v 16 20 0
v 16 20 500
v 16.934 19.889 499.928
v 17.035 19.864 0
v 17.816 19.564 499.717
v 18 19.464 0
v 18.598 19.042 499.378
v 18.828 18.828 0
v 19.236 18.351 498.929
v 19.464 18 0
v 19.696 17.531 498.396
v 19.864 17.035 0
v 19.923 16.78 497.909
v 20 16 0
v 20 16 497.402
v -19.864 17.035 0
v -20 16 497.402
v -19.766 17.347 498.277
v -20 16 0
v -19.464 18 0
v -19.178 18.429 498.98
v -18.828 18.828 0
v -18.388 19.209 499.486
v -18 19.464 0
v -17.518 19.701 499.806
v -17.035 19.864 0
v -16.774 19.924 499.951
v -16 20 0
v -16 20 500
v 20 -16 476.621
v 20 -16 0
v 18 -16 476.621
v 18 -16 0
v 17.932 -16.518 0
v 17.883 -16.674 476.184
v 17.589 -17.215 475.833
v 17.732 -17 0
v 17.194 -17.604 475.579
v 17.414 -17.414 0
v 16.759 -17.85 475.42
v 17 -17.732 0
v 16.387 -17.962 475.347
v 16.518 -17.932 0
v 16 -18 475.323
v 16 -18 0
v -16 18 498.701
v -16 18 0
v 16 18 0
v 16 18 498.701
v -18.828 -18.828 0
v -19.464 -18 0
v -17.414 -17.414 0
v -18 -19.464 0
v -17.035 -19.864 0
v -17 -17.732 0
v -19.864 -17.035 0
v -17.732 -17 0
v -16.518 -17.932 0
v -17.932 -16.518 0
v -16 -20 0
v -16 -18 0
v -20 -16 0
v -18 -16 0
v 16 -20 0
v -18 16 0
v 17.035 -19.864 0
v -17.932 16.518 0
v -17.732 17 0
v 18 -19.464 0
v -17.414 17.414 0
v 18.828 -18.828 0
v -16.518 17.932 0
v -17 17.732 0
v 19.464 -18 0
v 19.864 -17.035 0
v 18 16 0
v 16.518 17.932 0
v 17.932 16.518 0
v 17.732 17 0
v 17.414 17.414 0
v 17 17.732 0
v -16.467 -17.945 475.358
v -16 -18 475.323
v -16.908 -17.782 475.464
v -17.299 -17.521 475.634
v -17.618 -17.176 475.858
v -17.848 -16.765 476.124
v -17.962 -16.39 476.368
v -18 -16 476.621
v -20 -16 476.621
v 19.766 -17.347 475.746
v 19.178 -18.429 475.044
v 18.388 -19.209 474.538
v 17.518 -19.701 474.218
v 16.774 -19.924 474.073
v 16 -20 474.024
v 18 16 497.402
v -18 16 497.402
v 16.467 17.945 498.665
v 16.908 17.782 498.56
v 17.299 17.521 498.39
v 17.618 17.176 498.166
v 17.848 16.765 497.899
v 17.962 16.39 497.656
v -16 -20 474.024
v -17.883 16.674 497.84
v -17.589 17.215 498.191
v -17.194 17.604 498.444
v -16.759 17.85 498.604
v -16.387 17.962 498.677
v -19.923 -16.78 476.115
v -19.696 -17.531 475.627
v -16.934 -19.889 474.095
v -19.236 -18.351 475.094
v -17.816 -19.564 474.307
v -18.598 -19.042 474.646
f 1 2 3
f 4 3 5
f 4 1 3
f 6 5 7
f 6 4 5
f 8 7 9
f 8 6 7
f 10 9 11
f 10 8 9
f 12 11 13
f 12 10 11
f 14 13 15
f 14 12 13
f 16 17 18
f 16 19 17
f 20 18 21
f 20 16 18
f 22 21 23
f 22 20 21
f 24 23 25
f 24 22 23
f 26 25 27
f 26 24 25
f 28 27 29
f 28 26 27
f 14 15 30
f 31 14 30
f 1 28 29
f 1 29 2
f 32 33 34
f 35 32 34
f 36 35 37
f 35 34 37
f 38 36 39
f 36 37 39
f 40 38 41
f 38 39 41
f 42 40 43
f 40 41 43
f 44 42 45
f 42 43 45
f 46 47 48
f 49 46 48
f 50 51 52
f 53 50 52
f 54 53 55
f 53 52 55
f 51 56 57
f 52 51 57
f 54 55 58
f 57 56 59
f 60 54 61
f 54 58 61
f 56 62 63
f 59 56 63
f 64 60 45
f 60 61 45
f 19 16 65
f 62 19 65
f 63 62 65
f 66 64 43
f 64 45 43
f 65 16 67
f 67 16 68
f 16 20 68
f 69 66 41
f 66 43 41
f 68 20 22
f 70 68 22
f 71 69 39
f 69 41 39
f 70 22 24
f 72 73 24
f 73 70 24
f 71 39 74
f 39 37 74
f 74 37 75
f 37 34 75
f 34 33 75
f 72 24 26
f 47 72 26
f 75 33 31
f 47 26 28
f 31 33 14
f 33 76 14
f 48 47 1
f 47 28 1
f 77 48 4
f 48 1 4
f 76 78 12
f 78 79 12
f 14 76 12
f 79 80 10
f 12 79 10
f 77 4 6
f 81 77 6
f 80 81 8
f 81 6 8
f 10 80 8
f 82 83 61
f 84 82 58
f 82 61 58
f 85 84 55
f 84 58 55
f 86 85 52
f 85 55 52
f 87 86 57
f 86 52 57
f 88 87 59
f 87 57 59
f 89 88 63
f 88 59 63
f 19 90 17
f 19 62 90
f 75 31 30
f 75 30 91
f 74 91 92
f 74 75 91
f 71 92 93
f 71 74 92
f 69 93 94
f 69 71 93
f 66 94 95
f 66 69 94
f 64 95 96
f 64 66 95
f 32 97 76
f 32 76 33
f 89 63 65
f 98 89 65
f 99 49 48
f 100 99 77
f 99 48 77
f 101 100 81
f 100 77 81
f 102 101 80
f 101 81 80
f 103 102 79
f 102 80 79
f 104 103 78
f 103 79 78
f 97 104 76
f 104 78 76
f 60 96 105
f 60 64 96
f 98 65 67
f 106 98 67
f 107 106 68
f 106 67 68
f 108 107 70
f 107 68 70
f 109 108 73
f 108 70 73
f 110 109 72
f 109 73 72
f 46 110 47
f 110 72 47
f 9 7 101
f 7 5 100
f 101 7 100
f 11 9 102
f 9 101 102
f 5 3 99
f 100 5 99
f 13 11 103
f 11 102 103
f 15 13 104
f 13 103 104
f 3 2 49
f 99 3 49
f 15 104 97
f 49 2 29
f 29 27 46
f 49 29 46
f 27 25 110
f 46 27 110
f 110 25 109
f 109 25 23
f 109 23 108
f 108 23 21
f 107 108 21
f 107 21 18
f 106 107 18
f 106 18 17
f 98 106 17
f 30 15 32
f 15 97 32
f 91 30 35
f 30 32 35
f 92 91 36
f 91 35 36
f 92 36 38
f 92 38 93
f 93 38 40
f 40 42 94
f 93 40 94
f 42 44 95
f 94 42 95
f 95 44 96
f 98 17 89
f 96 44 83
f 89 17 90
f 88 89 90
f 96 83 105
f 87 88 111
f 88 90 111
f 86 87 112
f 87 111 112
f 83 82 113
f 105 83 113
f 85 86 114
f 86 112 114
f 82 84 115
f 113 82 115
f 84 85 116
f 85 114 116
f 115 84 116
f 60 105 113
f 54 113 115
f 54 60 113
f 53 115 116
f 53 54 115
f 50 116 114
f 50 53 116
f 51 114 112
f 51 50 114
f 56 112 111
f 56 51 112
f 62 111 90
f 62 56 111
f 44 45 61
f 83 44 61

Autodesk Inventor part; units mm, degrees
ref_plane "YZ Plane" through (0, 0, 0) normal (1, 0, 0) x (0, 1, 0)
ref_plane "Start plane" through (0, 0, 0) normal (0, 0, 1) x (1, 0, 0)
ref_plane "End plane" through (0, 0, 500) normal (0, 0, 1) x (1, 0, 0)
sketch "Sketch" plane through (0, 0, 0) normal (0, 0, 1) x (1, 0, 0)
  line L0 (-20, -16) -> (-20, 16)
  line L1 (-16, 20) -> (16, 20)
  line L2 (20, 16) -> (20, -16)
  line L3 (16, -20) -> (-16, -20)
  arc A0 (-20, -16) -> (-16, -20) centre (-16, -16) ccw
  arc A1 (20, 16) -> (16, 20) centre (16, 16) ccw
  arc A2 (-16, 20) -> (-20, 16) centre (-16, 16) ccw
  arc A3 (16, -20) -> (20, -16) centre (16, -16) ccw
  arc A4 (-16, 18) -> (-18, 16) centre (-16, 16) ccw
  line L4 (-16, 18) -> (16, 18)
  arc A5 (18, 16) -> (16, 18) centre (16, 16) ccw
  line L5 (18, 16) -> (18, -16)
  arc A6 (16, -18) -> (18, -16) centre (16, -16) ccw
  line L6 (16, -18) -> (-16, -18)
  arc A7 (-18, -16) -> (-16, -18) centre (-16, -16) ccw
  line L7 (-18, -16) -> (-18, 16)
  line L8 (0, 29.1598) -> (0, -29.1598) construction
  line L9 (-29.1598, 0) -> (29.1598, 0) construction
  dimension "d7" = 4
  dimension "d9" = 40
  dimension "d11" = 40
  dimension "d12" = 2
  dimension "d15" = 20
  dimension "d16" = 20
extrude "Body" add sketch "Sketch" along normal up to surface (500 mm away) from surface at 0
sketch "Sketch3" plane through (0, 0, 0) normal (0, 0, 1) x (1, 0, 0)
  line L0 (0, 0) -> (10, 0)
ref_plane "Work Plane3" through (0, 0, 0) normal (0, -1, 0) x (1, 0, 0)
sketch "Sketch5" plane through (0, 0, 0) normal (1, 0, 0) x (0, 1, 0)
  line L0 (-20, 0) -> (-20, 500) projected
  line L1 (-20, 0) -> (-20, 500) projected
  line L2 (20, 0) -> (20, 500) projected
  line L3 (20, 0) -> (20, 500) projected
  line L4 (-20, 500) -> (20, 500)
  line L5 (20, 500) -> (-20, 474.0237)
  point P0 (0, 0)
  point P1 (-20, 474.0237)
  dimension "d20" = 33
extrude "Extrusion2" cut sketch "Sketch5" along normal through all both and the other way through all
sketch "Sketch4" plane through (0, 0, 0) normal (0, -1, 0) x (1, 0, 0)
  line L0 (-2, 0) -> (12, 0) projected
  line L1 (-2, 500) -> (12, 500) projected
  dimension "d18" = 500
equation "\"d7\" = G_IR"
equation "\"d9\" = G_W"
equation "\"d11\" = G_H"
equation "\"d12\" = G_T"
equation "\"d15\" = 0.5 * d9"
equation "\"d16\" = 0.5 * d11"
equation "\"d3\" = G_L"
equation "\"G_W\" = 40"
equation "\"G_H\" = 40"
equation "\"G_T\" = 2"
equation "\"G_IR\" = 4"
equation "\"G_L\" = d18"
equation "\"G_OFFSET_START\" = 0"
equation "\"G_OFFSET_END\" = 0"
properties part number "ISO 4019 - 40x40x2 - 500" material "Steel, Mild"
